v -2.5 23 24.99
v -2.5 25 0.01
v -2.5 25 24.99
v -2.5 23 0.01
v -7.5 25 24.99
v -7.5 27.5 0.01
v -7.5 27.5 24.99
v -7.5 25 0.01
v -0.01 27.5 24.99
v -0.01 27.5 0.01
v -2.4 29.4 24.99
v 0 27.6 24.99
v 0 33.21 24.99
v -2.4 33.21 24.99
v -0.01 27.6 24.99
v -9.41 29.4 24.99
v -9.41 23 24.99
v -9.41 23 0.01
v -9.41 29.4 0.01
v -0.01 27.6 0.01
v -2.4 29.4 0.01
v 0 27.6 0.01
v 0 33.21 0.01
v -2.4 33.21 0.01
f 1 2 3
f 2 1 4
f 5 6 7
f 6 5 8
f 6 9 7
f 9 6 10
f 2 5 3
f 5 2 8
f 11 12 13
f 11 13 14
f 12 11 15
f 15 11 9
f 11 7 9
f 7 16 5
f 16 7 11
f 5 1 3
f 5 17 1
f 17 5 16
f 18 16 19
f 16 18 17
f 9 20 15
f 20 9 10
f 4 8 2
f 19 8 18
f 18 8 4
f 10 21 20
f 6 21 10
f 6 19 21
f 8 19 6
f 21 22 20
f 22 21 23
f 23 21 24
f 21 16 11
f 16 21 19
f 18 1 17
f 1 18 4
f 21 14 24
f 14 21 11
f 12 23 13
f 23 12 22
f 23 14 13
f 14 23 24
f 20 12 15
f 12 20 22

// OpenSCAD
// Measurements are based on jig recommendations

angle = 35;
size = 25;

h = 25;

wall=2.5; // because it seems to work

text_depth = .4  * 2; // set to a ratio of your extruder width

// A global overlap variable (to prevent printing glitches)
$o = .06;

// Render the part
chisel_sharpening_jig_key();

/* ******************************************************************************
 * Main module code below:
 * ****************************************************************************** */

module chisel_sharpening_jig_key() {
    rotate([0,-90,0])
    union(){
        difference(){
            translate([0.01,23,0.01]) cube([24.98,6.4,9.4]);
            union() {
                cube([h, size + .1, wall]);
                translate([0,size, 0])
                    cube([h, wall, 5+wall]);
                translate([0,0,-15+$o])
                    cube([h, wall, 15+$o]);
                *translate([0,0, 0])
                    cube([wall, size, 10]);
            }
        }
        translate([0.01,27.6,0]) cube([24.98,5.61,2.4]);
    }
}
